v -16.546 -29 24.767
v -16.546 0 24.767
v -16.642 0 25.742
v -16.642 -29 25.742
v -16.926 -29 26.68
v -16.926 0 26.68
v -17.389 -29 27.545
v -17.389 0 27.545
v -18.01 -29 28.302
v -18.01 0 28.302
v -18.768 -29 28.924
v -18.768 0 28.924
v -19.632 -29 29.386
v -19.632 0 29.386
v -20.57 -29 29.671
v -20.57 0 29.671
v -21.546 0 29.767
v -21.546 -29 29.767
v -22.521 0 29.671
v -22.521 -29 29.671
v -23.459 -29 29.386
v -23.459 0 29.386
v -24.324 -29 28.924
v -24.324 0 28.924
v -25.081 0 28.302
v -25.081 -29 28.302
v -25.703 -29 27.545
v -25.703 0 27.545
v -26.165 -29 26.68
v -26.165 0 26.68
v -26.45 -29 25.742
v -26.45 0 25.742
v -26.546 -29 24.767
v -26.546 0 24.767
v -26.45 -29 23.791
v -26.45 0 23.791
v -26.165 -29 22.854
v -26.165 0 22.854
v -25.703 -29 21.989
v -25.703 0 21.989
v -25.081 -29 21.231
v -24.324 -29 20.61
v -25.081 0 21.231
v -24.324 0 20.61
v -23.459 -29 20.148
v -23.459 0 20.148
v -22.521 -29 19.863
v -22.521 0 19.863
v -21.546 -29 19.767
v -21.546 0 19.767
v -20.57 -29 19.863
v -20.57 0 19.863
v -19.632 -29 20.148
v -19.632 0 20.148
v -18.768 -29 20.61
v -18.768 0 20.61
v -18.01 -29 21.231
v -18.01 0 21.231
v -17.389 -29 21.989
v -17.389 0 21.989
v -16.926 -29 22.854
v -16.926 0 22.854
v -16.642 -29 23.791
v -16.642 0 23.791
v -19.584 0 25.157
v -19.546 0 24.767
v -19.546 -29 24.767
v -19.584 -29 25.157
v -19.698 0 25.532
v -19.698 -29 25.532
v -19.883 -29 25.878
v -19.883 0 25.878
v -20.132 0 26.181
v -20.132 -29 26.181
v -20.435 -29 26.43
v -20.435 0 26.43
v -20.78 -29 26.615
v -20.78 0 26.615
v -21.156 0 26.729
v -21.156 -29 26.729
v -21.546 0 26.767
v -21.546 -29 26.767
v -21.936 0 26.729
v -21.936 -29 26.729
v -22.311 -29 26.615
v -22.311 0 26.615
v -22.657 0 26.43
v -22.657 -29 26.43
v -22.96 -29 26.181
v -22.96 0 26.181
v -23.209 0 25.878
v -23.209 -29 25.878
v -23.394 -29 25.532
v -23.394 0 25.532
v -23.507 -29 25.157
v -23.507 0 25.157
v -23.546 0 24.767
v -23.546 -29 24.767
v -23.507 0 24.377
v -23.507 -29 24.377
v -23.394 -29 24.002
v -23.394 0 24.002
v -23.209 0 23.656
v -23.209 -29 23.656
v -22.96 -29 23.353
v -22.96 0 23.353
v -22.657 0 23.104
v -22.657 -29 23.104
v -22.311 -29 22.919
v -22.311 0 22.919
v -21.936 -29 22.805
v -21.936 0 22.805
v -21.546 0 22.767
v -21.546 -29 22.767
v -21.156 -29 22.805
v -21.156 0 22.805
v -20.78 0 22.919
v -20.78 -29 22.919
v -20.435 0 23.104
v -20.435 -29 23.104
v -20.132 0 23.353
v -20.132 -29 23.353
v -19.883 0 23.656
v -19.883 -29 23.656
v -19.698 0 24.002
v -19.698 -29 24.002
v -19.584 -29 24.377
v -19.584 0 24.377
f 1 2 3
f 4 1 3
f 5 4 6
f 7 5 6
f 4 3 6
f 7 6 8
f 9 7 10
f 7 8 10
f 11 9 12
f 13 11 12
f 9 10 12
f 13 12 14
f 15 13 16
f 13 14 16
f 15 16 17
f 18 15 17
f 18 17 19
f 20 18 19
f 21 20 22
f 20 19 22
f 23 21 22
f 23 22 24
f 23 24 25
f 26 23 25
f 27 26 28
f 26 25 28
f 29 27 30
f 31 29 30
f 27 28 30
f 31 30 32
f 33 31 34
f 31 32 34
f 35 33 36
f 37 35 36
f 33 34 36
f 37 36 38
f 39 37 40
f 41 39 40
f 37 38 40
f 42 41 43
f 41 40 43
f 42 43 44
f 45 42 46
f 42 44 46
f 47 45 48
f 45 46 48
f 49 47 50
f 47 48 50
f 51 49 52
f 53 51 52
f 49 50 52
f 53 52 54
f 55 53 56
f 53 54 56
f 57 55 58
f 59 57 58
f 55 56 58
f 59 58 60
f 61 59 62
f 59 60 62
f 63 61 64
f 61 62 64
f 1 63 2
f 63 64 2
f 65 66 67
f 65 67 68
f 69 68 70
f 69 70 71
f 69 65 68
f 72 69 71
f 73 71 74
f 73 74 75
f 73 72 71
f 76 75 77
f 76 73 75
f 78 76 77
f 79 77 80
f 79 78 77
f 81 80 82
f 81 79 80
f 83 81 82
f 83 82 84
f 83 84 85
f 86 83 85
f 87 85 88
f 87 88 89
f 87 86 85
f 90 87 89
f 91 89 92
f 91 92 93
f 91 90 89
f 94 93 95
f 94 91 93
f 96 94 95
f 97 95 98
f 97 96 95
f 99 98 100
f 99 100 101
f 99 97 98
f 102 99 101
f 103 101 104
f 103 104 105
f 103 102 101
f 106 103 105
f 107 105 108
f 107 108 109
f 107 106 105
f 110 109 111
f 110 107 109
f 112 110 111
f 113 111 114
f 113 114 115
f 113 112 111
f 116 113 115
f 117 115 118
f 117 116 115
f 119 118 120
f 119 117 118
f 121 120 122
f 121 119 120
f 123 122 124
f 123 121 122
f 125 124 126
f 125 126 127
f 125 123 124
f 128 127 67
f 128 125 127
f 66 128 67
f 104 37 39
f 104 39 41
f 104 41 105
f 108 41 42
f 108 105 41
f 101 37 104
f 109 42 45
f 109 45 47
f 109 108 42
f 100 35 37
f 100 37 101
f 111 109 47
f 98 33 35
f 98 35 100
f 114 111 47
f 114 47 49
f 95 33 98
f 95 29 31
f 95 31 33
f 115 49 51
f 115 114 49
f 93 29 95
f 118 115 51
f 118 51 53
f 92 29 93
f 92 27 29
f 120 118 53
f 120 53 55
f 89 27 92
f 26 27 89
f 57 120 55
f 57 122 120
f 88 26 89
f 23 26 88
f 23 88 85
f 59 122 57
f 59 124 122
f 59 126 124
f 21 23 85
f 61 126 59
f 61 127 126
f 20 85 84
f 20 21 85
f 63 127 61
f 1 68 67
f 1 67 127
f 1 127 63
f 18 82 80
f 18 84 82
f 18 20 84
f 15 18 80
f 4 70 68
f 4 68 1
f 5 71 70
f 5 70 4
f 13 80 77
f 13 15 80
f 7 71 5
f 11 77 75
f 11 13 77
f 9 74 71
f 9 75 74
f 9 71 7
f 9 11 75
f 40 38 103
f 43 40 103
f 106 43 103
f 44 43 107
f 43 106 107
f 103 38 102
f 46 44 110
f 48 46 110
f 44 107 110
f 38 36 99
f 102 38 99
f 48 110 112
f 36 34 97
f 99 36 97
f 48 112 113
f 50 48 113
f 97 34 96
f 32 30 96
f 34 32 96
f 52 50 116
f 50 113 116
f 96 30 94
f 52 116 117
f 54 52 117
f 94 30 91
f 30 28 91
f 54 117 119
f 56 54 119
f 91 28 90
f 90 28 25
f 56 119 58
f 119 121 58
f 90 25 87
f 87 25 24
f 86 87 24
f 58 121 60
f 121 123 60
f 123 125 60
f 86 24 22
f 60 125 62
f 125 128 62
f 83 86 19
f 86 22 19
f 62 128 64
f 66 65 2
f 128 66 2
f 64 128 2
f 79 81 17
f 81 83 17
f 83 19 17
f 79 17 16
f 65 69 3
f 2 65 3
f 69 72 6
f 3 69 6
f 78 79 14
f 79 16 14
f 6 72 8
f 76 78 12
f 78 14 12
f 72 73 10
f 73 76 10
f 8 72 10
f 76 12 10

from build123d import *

# Parameters (mm, degrees)
F0_R     = 5
F0_R_2   = 2
F1_DEPTH = 29
F2_DEPTH = 4


with BuildPart() as f1:
    # F0 (on Front) → F1 (new body)
    with BuildSketch(Plane.XZ):
        with Locations((-21.545855, 24.76695)):
            Circle(F0_R)
        with Locations((-21.545855, 24.76695)):
            Circle(F0_R_2, mode=Mode.SUBTRACT)
    extrude(amount=F1_DEPTH)


with BuildPart() as f2:
    # F0 (on Front) → F2 (new body)
    with BuildSketch(Plane.XZ):
        with Locations((-21.545855, 24.76695)):
            Circle(F0_R_2)
    extrude(amount=-F2_DEPTH)


solid = f1.part
